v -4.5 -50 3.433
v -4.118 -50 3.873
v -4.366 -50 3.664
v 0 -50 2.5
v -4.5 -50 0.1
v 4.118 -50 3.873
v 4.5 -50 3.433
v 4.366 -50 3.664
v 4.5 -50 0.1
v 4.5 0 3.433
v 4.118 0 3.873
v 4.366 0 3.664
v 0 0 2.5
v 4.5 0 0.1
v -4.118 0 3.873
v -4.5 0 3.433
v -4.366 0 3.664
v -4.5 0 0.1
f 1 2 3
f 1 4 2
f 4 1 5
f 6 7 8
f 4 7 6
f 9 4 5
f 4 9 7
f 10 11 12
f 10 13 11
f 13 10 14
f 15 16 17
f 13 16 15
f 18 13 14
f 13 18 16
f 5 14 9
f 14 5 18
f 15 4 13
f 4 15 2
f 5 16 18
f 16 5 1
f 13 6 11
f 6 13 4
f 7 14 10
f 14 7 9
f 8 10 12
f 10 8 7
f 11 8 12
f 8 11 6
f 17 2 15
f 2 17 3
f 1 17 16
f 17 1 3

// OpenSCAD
// file: globals.scad
/*
Most things in this file is represented as one millimeter, so keep that in mind while changing things.
Some of the setting are not mm but at variables that you can set, such as 2*x=2x and you are setting what x is.
I will try to specify when things are variables and not exact measurements.
*/

obj_leg = 30;
leg_length = 5.5;
small_number = 0.001;
metal_core_rode_global = 5;


///////////////// number of holes /////////////////////
z_hole_number = 8;
other_holes = 8;

///////////////// Pins /////////////////////

//pins that poke out
ball_size = 10;
pin_height = 20;
pin_diameter = 6;


//holes
hole_ball_size = ball_size;
hole_pin_height = pin_height;
hole_pin_diameter = pin_diameter;

///////////////// Z THINGS /////////////////////

berring_slot_width = 7.5;
berring_slot_depth = 6.5;
metal_core_rode = 5;

///////////////// X THINGS /////////////////////

//male dove tails
max_width=8;
min_width=5;
depth=5;
height=obj_leg/2;

//female dove tails, this is found on the y mounts
girl_max_width=11;
girl_min_width=5;
girl_depth=5;
girl_height=obj_leg;


///////////////// Y THINGS /////////////////////
/*
The Y is so normal that all of those global variables at the top should change all of the setting in it, this section is set her incase there are variables set in the future development of this project.
*/
// file: include.scad
//////////////////      END SECTION       //////////////////

	module added_pins(){
		difference(){
			union(){
				translate([30/(15/4),obj_leg*leg_length,30/(15/4)]) pin();
				translate([30/(15/4)+14.5,obj_leg*leg_length,30/(15/4)+14]) pin();
			}
			union(){
							translate([30/(15/4)+13.5,obj_leg*leg_length-20,30/(15/4)+5])cube(size=[2,40,15]);
							translate([30/(15/4)+7.5,obj_leg*leg_length-20,30/(15/4)+15])rotate([0,90,0]) cube(size=[2,40,15]);	

							translate([30/(15/4)-1,obj_leg*leg_length-20,30/(15/4)-8])cube(size=[2,40,15]);
							translate([30/(15/4)-10,obj_leg*leg_length-20,30/(15/4)+1])rotate([0,90,0]) cube(size=[2,40,15]);
			}
		}
	}
	module taken_pins() {
		translate([30/(15/4)+14,obj_leg*leg_length-10,30/(15/4)]) mirror_pin();
		translate([30/(15/4),obj_leg*leg_length-10,30/(15/4)+15]) mirror_pin();
	}


//////////////////      OTHER STUFF       //////////////////

	module holes() {
		rotate([0,0,90]) for(y=[0:other_holes])
		translate([obj_leg+y*15,-15.5,7.5]) union() {
			translate([7.5,0,15]) hole_up();
			hole_down();
		}
	}
	module extend_holes() {
	module top(){
		rotate([0,0,90]) for(y=[0:other_holes+1])
		translate([(30/4)+y*15,-15.5,7.5]) union() {
			translate([7.5,0,15]) hole_up();
		}
	}
	module bottom(){
		rotate([0,0,90]) for(y=[0:other_holes+2])
		translate([(30/4)+y*15,-15.5,7.5]) union() {
			hole_down();
		
}
	}
	union(){
		top();
		bottom();
	}
	}

	module hole() {
		union() {
			rotate([90, 90, 0]) cylinder(h=40, d=hole_pin_diameter, center=true);
			translate([0,7.5,0]) sphere(d=hole_ball_size);
			translate([0,-6,0]) sphere(d=hole_ball_size);
		}
	}
	module hole_up() {
		union() {
			rotate([90, 90, 0]) cylinder(h=40, d=hole_pin_diameter, center=true);
			translate([0,7.5,10]) cylinder(h=hole_pin_height, d=hole_pin_diameter, center=true);
			translate([0,-6,10]) cylinder(h=hole_pin_height, d=hole_pin_diameter, center=true);
			translate([0,7.5,0]) sphere(d=hole_ball_size);
			translate([0,-6,0]) sphere(d=hole_ball_size);
		}
	}
	module hole_down() {
		union() {
			rotate([90, 90, 0]) cylinder(h=40, d=hole_pin_diameter, center=true);
			translate([0,7.5,-10]) cylinder(h=hole_pin_height, d=hole_pin_diameter, center=true);
			translate([0,-6,-10]) cylinder(h=hole_pin_height, d=hole_pin_diameter, center=true);
			translate([0,7.5,0]) sphere(d=hole_ball_size);
			translate([0,-6,0]) sphere(d=hole_ball_size);
		}
	}
	module pin() {
		union() {
			rotate([90, 90, 0]) cylinder(h=pin_height, d=pin_diameter, center=true);
			translate([0,7.5,0]) sphere(d=ball_size);
		}
	}

	module mirror_pin() {
		rotate([90, 90, 0]) cylinder(h=hole_pin_height+small_number, d=hole_pin_diameter, center=true);
		translate([0,-(pin_height-(ball_size/2)),0]) sphere(d=ball_size);
	}


//////////////////      SOME RACK AND Z THINGS       //////////////////

module z_holes() {
    rotate([0,-90,0]) for(z=[0:z_hole_number])
    translate([22.5+z*15,16,-12])
        hole();
}

module pin_cuts() {
	union(){
		cube(size=[2,10,40], center=true);
		rotate([0,0,90]) cube(size=[2,10,40], center=true);
	}
}
module pin_uncut() {
	union(){
		rotate([0, 0, 90]) cylinder(h=hole_pin_height, d=hole_pin_diameter, center=true);
		translate([0,0,10]) sphere(d=ball_hole);
	}
}


module pin_out() {
	union(){
		rotate([0, 0, 90]) cylinder(h=pin_height, d=pin_diameter, center=true);
		translate([0,0,10]) sphere(d= ball_size);
	}
}


module pins_z(){
	difference() {
		pin_out();
		pin_cuts();
	}
}
//////////////////      RACK AND SLIDE     ///////////////////

module straight_pins() {
	for(z=[0:((((obj_leg*leg_length)*2)-(obj_leg*2))/3)/14.5]) rotate([-90,0,0]) translate([z*15,30/(15/4),14]) pins_z();
	for(z=[0:((((obj_leg*leg_length)*2)-(obj_leg*2))/3)/14.5]) rotate([-90,0,0]) translate([z*15,30/(15/4)-14,14]) pins_z();
}
module stagger_pins() {
	for(z=[0:((((obj_leg*leg_length)*2)-(obj_leg*2))/3)/14.5]) rotate([-90,0,0]) translate([z*15,30/(15/4),14]) pins_z();
	for(z=[0:((((obj_leg*leg_length)*2)-(obj_leg*2))/3)/14.5]) rotate([-90,0,0]) translate([z*15+7,30/(15/4)-14,14]) pins_z();
}


//////////////////      DOVE TAIL       //////////////////

module male_dovetail(height) {
	dovetail_3d(max_width,min_width,depth,height);
}

module dovetail_3d(max_width=11, min_width=5, depth=5, height=30) {
	linear_extrude(height=height, convexity=2)
		dovetail_2d(max_width,min_width,depth);
}

module dovetail_2d(max_width=11, min_width=5, depth=5) {
	angle=atan((max_width/2-min_width/2)/depth);
	echo("angle: ", angle);
	polygon(paths=[[0,1,2,3,0]], points=[[-min_width/2,0], [-max_width/2,depth], [max_width/2, depth], [min_width/2,0]]);
}

//bow tie
	module tie_end(height){
				rotate([0,0,0]) translate([0,-0.01,((obj_leg/2)/2)]) male_dovetail(height);
				rotate([0,90,0]) translate([0,-0.01,((obj_leg/2)/2)]) male_dovetail(height);
				rotate([0,180,0]) translate([0,-0.01,((obj_leg/2)/2)]) male_dovetail(height);
				rotate([0,-90,0]) translate([0,-0.01,((obj_leg/2)/2)]) male_dovetail(height);
	}

module bow_support(){
	difference(){
		intersection(){
			translate([-15,0,-15]) cube([30,9,30]);
			scale([1.05,1.05,1.05]) rotate([0,45,0]) tie_end();
		}
		cube([29.2,29.2,29.2], center=true);
	}
}

	module wrap(units){
	for (y = [-1:units-2]) // two iterations, z = -1, z = 1
	{
			translate([15, (y*30)+15, 15]){
			for (r = [0:4]) // two iterations, z = -1, z = 1
			{
				rotate([0,r*90,0]) translate([0,15,15]) rotate([-90,0,0])male_dovetail(height=30);
			}
		}
	}
	}
// main file
length = 50;
tilt_level = 1.1;
scaling_x = .9;
scaling_y = 1;
scaling_z = 1;
include <include.scad>;
include <globals.scad>;

obj_leg= 12;

module half_dove() {
    intersection() {
        #translate([0.1,0,0]) cube([10, 10, length]);
        male_dovetail(height=length);
    }
}

module bow_tie_master(){
	union(){
		mirror([0,1,0]){
			half_dove();
		}
		half_dove();		
	}
}

intersection(){
    scale([scaling_x,scaling_y,scaling_z])	rotate([90,270,0]) bow_tie_master();
    rotate([90,0,0]) cylinder(r=5.7, h=200);
}
